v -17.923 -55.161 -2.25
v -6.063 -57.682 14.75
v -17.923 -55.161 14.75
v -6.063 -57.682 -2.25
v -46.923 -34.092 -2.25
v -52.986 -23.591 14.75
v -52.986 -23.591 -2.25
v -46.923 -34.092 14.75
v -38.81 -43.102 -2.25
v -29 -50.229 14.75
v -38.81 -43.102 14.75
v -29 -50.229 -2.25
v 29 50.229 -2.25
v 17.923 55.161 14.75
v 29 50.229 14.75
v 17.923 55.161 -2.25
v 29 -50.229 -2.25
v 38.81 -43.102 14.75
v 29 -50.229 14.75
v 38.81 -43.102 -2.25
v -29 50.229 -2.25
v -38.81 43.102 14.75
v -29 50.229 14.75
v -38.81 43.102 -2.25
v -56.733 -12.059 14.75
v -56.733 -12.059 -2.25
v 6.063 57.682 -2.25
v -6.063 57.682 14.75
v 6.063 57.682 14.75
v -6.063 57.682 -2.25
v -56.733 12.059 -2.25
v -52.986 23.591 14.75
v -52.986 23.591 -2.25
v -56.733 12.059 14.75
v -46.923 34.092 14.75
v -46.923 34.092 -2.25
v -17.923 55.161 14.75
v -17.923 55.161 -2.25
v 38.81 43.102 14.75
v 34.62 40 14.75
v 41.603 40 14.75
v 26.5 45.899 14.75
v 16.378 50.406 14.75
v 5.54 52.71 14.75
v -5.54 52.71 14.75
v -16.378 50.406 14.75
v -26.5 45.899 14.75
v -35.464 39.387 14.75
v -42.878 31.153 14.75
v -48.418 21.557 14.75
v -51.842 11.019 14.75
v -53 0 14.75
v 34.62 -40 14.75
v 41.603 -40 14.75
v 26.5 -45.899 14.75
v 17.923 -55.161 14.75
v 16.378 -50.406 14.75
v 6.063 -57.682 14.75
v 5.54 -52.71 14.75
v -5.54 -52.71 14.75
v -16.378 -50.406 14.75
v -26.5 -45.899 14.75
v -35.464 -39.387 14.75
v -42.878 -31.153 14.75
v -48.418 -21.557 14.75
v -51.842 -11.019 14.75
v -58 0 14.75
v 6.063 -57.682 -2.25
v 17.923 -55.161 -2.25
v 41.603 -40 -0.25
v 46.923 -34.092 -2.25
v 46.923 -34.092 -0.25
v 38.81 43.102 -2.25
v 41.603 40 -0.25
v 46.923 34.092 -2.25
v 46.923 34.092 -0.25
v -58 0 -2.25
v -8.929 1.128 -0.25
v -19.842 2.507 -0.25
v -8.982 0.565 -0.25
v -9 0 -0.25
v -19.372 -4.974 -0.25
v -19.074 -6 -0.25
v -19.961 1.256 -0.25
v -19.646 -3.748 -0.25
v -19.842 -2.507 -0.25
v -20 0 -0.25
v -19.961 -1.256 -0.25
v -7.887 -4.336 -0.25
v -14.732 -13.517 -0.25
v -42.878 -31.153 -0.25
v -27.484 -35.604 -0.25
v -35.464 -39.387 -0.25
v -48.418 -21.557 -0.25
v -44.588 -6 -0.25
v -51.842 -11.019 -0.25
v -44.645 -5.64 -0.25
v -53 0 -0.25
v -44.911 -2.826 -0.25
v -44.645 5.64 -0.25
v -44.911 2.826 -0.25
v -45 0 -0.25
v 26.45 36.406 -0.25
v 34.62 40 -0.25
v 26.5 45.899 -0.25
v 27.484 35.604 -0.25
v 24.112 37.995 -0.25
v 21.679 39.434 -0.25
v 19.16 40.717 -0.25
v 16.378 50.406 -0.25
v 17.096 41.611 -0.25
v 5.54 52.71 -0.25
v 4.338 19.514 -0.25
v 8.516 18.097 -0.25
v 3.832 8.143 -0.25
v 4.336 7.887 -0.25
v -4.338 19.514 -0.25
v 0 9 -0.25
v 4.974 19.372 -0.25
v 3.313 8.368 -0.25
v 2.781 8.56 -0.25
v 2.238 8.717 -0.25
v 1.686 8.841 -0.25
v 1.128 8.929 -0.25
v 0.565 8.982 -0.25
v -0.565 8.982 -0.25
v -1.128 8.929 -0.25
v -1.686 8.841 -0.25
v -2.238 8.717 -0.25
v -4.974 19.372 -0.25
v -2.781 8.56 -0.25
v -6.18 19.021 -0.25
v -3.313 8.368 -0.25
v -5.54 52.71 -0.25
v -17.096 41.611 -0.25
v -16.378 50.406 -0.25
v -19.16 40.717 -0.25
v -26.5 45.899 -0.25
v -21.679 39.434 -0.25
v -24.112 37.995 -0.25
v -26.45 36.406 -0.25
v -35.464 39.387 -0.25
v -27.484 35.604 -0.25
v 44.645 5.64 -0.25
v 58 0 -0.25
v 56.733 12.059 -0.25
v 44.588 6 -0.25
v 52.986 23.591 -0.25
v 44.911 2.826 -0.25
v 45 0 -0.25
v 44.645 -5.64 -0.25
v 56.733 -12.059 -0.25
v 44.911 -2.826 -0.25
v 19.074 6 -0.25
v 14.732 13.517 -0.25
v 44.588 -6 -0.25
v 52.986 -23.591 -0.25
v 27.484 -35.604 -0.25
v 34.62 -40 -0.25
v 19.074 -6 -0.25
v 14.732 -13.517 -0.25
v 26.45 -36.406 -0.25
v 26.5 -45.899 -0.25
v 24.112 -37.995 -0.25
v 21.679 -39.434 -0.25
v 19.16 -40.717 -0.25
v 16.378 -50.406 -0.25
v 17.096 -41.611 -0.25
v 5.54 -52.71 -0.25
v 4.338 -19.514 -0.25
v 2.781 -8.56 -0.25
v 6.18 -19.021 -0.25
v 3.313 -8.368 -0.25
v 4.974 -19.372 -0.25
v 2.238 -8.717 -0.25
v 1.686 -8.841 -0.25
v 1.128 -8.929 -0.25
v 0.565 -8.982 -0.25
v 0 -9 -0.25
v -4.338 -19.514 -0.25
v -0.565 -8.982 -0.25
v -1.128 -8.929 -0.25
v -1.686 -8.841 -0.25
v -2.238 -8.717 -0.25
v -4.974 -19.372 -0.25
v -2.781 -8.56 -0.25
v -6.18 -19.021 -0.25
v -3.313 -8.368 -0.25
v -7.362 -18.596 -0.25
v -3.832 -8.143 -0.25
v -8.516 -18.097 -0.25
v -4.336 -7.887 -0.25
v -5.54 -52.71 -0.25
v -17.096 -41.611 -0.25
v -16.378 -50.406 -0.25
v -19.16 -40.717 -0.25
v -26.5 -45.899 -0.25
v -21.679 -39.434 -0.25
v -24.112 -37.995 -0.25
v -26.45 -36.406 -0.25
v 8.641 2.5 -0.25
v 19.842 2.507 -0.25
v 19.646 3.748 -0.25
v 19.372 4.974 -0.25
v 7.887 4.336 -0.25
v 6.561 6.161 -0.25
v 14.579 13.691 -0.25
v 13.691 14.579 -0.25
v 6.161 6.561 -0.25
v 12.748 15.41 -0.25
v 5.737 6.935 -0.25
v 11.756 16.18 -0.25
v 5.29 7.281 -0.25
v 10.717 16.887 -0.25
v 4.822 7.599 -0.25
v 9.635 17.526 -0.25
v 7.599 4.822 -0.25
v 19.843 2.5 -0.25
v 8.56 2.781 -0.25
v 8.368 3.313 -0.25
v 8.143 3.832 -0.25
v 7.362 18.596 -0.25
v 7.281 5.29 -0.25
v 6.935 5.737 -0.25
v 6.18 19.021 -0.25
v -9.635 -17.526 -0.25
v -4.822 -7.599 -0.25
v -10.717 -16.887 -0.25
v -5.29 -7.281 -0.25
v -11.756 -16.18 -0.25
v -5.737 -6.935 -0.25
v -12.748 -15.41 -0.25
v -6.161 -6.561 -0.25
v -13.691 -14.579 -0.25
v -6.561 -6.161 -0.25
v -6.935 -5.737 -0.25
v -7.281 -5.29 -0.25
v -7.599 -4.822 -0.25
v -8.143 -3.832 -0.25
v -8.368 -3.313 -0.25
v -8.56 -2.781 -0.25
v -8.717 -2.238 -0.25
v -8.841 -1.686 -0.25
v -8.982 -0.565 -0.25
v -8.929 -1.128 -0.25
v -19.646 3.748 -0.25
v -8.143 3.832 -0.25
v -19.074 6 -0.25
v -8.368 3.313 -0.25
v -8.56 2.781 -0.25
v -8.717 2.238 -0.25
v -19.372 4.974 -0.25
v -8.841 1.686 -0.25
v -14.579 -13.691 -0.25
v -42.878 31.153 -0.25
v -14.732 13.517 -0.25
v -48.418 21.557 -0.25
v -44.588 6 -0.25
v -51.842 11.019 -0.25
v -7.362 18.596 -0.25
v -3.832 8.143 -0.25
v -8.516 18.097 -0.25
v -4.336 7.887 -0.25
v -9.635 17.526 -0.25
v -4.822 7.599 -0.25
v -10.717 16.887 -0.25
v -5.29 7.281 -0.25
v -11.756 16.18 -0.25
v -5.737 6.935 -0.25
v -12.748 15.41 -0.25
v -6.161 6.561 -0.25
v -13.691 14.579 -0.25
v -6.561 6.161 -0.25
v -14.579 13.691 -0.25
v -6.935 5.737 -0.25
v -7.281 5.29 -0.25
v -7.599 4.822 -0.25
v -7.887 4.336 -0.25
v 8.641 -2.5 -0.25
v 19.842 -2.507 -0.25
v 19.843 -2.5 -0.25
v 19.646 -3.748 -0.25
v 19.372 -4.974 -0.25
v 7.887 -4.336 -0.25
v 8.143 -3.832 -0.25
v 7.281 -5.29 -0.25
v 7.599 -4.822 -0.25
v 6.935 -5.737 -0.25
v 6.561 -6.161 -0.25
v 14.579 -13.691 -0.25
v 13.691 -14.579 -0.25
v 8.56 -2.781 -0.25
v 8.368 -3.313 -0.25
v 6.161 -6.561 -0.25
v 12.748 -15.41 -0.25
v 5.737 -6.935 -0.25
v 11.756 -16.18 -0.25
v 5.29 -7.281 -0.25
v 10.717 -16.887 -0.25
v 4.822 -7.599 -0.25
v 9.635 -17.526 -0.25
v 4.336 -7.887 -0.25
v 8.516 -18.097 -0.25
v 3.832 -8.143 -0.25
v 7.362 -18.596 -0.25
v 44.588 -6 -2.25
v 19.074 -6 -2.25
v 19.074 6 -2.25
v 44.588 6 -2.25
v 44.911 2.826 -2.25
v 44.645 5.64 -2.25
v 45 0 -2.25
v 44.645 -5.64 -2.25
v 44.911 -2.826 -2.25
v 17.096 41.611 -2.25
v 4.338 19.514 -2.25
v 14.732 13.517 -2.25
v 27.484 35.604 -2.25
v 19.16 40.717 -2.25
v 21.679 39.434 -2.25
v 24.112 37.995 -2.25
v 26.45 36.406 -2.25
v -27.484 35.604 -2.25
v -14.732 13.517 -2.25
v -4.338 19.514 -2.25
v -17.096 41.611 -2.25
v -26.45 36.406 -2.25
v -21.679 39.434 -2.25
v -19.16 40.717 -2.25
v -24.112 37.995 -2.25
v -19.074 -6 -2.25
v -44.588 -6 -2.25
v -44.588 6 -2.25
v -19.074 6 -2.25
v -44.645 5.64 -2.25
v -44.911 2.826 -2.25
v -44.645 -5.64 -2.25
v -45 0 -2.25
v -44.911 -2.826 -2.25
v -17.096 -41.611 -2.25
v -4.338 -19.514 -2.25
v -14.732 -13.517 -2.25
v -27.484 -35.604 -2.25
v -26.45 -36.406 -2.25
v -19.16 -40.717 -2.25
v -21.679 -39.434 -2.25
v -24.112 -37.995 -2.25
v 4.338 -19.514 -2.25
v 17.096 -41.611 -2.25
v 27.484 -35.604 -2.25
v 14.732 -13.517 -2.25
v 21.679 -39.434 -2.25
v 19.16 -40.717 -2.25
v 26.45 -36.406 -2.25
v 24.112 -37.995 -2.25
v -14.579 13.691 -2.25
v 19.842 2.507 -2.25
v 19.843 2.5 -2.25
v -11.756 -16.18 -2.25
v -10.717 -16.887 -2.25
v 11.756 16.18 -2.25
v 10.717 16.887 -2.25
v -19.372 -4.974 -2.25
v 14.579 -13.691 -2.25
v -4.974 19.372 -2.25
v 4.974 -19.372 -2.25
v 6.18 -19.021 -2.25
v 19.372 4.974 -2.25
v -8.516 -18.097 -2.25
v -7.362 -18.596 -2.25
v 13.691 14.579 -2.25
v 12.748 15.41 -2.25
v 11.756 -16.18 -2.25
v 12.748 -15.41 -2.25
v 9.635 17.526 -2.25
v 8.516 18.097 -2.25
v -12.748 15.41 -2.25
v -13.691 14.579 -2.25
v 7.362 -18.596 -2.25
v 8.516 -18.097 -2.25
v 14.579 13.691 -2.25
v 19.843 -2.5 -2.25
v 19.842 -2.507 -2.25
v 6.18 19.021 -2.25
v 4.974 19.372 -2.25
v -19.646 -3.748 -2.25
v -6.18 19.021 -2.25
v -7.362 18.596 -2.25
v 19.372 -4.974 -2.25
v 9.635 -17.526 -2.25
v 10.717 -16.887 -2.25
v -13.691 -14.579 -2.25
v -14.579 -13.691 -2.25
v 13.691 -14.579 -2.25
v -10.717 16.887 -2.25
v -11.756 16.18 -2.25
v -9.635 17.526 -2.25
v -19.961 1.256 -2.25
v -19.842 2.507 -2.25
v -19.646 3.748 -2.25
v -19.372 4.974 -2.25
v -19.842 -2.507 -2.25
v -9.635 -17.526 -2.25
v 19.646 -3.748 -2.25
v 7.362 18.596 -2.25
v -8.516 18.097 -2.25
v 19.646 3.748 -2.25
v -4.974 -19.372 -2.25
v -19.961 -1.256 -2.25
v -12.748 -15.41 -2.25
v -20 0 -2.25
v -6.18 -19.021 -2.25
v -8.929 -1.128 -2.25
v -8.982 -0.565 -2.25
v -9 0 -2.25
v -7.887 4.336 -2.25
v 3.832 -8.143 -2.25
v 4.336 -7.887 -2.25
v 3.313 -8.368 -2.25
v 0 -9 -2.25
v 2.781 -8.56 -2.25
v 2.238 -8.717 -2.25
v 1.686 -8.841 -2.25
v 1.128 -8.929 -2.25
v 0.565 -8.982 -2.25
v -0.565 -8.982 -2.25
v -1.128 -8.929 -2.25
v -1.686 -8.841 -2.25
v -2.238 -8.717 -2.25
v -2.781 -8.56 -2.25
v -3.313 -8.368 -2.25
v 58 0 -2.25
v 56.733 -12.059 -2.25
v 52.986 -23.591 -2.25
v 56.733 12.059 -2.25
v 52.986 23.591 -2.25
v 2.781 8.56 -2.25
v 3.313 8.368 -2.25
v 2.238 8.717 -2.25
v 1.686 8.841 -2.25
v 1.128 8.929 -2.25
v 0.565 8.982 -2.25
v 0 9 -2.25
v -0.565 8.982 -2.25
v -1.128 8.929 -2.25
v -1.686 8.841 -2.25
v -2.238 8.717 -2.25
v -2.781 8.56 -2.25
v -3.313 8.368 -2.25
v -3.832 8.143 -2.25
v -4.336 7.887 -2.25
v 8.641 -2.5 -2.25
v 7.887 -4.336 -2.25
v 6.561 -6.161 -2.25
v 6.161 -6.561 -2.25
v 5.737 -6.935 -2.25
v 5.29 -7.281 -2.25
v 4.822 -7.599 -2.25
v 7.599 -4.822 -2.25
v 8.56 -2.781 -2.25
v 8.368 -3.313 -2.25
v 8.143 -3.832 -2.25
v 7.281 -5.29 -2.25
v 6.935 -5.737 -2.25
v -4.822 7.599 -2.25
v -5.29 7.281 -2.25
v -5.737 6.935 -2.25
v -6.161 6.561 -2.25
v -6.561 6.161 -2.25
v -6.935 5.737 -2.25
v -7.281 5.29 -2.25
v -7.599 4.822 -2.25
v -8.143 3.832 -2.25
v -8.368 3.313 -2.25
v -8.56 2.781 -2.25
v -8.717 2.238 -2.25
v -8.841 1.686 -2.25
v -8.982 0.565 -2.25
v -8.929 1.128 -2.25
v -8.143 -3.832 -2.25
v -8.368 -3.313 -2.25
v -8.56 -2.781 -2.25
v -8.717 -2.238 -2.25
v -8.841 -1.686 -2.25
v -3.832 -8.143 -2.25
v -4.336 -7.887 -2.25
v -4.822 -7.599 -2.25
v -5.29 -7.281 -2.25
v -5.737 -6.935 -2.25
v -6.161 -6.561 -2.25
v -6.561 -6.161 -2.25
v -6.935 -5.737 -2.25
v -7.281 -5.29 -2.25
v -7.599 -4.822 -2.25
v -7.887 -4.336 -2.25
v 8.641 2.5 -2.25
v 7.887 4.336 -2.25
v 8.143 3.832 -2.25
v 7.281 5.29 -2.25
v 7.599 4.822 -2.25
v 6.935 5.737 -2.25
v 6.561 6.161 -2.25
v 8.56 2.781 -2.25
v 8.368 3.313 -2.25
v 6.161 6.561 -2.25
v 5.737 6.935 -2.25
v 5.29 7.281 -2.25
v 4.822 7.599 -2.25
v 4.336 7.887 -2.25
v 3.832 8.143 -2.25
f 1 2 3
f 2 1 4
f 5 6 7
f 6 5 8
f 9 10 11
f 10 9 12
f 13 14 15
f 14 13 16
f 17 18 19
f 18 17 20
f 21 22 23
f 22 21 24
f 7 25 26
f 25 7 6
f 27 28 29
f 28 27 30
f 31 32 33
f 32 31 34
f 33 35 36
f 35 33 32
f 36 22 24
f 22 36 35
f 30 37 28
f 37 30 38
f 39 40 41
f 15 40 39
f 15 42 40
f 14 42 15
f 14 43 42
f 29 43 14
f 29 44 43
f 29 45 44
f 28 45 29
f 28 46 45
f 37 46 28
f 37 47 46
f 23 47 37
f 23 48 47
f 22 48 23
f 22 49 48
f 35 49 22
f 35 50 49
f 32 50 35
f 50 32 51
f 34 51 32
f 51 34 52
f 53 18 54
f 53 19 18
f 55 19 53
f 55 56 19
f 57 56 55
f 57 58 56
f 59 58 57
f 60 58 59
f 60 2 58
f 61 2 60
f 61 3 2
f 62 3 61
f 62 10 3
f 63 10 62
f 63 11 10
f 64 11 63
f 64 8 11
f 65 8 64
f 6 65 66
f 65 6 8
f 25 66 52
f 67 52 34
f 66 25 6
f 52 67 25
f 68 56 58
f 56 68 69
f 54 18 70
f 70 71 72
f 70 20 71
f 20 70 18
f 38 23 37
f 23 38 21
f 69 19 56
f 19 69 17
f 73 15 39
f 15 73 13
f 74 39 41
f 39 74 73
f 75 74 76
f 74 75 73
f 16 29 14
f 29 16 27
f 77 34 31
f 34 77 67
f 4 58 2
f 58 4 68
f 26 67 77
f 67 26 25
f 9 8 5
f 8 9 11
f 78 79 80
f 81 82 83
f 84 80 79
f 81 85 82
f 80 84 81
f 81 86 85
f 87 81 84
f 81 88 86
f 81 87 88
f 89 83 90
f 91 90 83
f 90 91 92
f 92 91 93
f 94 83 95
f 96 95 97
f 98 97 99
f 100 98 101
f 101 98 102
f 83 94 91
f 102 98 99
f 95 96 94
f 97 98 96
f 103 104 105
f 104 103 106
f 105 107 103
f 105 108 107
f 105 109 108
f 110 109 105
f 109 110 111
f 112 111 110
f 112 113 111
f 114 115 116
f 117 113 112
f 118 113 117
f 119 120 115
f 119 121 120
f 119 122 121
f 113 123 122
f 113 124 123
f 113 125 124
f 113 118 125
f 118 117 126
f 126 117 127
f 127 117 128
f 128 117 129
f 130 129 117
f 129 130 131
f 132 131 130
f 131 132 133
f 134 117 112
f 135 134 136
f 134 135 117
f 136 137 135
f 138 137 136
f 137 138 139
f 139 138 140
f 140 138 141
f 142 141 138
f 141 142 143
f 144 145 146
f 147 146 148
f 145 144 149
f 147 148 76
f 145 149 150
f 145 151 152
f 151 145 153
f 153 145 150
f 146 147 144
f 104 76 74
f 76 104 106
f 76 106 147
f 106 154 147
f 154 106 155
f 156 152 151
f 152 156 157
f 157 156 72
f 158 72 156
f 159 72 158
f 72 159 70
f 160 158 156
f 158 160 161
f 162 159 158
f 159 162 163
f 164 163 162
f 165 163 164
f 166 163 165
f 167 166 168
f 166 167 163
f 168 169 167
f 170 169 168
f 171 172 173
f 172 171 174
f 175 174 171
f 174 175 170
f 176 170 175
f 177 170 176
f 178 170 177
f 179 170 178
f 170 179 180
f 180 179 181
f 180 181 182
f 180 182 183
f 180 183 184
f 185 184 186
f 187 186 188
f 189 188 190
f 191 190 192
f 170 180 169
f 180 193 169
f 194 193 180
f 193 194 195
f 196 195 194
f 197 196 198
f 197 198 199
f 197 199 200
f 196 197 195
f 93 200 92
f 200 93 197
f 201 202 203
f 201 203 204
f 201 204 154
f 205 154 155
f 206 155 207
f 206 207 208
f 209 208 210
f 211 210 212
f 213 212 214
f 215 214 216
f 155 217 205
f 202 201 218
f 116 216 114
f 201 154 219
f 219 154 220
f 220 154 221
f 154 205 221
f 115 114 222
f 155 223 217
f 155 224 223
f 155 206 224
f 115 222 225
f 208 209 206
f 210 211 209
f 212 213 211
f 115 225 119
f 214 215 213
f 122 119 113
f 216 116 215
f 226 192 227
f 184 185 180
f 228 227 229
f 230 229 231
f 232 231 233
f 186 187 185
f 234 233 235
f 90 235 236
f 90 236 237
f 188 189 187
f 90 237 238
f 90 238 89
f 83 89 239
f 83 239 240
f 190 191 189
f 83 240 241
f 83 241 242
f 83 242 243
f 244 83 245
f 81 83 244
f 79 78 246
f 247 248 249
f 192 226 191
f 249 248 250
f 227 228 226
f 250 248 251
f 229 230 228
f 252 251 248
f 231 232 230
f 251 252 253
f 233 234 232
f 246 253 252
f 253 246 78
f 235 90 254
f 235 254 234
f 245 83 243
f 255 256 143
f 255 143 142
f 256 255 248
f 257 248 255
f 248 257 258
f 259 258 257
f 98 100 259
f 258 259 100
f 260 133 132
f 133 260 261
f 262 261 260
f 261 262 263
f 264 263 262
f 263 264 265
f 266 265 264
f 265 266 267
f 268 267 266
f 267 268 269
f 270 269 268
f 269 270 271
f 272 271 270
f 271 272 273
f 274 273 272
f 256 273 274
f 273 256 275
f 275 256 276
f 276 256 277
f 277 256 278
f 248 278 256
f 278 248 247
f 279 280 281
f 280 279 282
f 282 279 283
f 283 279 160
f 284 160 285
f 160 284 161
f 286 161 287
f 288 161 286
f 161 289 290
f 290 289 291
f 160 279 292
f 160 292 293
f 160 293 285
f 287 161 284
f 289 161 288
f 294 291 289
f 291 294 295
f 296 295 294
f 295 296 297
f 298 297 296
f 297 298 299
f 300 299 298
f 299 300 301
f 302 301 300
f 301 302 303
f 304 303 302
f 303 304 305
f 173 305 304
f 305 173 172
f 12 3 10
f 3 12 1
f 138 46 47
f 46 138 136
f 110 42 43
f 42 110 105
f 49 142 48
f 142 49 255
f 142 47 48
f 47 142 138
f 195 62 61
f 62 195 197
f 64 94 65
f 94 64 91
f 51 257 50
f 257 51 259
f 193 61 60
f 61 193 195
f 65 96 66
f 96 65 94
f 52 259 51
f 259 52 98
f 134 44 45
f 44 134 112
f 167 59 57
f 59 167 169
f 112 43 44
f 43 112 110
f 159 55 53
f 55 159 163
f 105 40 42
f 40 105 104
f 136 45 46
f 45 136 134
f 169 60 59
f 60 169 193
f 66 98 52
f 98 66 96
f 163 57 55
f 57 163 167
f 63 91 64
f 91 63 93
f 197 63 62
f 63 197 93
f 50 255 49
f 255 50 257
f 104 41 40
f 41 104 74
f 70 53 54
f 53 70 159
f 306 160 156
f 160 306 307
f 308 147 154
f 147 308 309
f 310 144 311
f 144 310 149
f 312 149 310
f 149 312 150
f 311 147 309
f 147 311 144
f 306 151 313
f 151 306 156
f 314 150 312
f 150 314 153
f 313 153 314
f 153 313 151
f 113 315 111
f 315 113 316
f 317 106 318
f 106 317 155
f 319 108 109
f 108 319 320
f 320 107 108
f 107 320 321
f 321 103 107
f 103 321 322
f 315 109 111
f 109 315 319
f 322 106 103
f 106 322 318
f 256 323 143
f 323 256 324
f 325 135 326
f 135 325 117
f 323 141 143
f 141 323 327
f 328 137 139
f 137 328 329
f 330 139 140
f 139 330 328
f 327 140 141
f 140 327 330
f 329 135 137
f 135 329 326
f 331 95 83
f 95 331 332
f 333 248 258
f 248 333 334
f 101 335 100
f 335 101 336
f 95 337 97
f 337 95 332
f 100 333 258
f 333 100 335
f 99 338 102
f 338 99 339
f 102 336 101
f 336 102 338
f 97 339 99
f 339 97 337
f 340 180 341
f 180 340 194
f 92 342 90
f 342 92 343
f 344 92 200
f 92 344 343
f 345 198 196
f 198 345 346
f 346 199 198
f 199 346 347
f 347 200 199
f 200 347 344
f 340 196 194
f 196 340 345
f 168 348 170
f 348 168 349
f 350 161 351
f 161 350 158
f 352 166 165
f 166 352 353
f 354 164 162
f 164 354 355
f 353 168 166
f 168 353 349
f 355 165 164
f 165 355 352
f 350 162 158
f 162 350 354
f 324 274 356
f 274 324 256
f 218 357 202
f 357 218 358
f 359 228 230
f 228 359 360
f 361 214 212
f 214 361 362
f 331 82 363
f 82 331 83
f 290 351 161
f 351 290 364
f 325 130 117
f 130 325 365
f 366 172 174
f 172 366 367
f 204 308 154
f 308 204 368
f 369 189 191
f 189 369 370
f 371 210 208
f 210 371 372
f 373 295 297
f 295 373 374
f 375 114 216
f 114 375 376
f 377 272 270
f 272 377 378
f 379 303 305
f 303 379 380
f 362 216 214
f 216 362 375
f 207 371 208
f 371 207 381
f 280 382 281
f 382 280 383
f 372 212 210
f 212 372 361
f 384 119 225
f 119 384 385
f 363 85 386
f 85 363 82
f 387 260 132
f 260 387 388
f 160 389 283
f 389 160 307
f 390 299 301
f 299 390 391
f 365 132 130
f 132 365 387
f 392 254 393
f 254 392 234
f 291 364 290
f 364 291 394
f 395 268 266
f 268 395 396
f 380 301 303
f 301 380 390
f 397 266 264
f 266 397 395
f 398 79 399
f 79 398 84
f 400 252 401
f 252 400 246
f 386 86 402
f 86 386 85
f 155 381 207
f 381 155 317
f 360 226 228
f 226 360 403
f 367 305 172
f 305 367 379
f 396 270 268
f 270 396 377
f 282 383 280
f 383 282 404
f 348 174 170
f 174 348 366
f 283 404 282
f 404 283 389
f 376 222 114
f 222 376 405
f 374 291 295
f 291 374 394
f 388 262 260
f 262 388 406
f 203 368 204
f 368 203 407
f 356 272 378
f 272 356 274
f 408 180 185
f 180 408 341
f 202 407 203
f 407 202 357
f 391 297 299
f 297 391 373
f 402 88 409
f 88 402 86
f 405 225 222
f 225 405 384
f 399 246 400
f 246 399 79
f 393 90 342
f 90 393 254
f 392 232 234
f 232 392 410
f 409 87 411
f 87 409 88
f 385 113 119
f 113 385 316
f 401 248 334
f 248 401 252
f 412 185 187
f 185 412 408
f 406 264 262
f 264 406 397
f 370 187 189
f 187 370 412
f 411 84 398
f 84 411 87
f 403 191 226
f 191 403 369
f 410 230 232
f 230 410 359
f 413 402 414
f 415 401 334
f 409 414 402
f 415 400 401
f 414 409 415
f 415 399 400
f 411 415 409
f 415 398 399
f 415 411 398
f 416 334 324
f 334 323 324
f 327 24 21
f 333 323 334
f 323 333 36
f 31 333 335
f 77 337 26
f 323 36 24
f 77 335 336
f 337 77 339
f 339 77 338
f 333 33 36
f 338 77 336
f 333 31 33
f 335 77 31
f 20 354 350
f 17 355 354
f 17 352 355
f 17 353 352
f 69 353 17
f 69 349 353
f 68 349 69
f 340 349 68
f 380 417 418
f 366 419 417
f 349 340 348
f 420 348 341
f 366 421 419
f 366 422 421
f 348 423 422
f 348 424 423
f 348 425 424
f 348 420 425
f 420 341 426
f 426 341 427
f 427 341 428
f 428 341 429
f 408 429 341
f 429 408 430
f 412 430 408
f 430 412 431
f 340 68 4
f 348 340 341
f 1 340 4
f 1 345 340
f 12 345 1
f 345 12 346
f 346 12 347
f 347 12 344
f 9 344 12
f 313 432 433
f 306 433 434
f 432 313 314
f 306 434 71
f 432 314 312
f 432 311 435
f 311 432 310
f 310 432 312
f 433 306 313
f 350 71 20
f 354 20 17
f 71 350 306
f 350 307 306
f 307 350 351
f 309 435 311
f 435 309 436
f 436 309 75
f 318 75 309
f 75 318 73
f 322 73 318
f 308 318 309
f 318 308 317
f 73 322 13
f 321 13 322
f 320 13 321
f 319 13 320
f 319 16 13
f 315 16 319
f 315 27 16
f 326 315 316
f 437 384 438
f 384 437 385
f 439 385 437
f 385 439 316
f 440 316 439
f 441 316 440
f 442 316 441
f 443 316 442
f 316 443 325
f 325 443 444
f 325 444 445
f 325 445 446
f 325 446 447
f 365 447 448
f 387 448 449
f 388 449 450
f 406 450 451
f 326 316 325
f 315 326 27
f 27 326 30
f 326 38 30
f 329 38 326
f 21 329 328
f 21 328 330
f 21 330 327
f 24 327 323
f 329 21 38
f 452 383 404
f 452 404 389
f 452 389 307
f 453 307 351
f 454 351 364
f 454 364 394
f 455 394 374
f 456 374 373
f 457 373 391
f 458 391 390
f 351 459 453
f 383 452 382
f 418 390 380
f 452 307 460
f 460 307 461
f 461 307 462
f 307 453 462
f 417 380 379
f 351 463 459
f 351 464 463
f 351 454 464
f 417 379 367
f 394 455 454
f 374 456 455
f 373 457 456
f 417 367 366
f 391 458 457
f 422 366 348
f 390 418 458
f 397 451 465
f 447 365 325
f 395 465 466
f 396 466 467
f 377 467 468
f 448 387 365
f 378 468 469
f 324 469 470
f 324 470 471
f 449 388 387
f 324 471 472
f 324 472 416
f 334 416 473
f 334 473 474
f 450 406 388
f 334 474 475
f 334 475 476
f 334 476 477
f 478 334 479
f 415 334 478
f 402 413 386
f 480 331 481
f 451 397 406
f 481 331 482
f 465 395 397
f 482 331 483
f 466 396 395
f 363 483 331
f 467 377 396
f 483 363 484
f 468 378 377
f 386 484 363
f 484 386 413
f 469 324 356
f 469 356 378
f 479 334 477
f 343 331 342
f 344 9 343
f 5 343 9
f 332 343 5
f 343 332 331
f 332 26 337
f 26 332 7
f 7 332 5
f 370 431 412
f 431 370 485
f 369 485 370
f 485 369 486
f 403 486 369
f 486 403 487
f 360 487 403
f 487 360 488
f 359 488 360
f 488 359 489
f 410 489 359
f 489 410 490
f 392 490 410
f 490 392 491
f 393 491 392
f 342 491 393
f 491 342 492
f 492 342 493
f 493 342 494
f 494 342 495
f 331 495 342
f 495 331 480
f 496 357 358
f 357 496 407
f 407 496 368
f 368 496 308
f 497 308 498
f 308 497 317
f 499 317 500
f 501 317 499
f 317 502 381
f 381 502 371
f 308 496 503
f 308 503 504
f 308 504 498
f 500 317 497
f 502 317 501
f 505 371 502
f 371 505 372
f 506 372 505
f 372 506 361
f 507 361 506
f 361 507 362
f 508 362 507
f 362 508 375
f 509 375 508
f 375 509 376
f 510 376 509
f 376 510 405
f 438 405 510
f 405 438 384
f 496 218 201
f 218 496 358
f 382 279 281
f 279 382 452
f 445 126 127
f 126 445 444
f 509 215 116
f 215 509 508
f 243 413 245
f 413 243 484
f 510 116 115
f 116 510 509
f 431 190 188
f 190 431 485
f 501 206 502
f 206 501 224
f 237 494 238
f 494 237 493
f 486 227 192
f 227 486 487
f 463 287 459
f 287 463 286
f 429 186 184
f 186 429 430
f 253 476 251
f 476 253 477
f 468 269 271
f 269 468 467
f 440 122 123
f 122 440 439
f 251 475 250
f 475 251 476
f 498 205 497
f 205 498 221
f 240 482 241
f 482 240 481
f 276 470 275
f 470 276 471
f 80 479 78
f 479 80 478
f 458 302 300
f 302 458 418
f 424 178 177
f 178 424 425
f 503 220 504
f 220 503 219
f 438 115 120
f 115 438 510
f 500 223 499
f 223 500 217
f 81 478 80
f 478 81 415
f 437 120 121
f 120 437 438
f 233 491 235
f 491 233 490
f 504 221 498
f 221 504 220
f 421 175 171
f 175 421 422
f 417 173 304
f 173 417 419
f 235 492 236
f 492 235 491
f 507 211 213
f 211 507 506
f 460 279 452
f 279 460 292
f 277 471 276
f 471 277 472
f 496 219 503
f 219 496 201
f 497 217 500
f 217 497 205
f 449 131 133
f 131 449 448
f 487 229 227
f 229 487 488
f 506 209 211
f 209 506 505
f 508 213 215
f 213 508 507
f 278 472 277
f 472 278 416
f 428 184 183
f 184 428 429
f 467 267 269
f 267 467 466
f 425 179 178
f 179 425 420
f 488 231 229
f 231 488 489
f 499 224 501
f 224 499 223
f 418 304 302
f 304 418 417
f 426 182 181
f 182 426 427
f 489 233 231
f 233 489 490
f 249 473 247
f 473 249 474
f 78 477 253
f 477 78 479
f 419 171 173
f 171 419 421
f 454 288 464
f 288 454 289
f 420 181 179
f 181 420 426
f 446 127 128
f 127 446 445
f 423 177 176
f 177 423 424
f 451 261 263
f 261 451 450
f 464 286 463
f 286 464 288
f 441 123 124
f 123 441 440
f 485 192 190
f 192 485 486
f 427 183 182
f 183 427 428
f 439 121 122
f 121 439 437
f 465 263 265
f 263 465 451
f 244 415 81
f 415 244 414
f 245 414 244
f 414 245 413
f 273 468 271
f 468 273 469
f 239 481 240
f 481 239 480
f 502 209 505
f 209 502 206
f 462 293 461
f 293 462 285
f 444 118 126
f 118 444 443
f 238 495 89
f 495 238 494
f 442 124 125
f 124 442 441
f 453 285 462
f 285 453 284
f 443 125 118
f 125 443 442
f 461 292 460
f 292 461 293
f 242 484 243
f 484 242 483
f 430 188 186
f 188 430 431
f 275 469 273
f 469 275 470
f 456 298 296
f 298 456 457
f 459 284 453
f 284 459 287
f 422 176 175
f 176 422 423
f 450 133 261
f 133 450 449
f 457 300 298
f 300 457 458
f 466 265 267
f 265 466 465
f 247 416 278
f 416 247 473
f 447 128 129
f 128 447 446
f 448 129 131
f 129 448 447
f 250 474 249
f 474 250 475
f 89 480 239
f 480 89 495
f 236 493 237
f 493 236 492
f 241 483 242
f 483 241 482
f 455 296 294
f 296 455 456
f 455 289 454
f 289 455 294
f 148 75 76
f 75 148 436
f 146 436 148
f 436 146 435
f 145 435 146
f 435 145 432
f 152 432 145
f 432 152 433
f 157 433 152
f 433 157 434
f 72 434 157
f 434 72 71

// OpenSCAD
module GM3_motor_shaft(height, diameter, key_length, screw_hole_diameter) {
	difference() {	
		cylinder(h=height, r=diameter/2, center=true, $fn=100);
		translate([0,key_length,0]) cube([diameter,key_length, height+2], center=true);
		translate([0,-key_length,0]) cube([diameter,key_length, height+2], center=true);
		cylinder(h=height+2, r= screw_hole_diameter/2, center=true, $fn=100);
	}
}

module GM3_motor_body() {
	translate([28,0,-20.8/2]){
		color("white")translate([-37/2,0,0])cube([37,22.3,20.8],center=true);
		color("grey")translate([27.2/2,0,0]) rotate([0,90,0]) cylinder(h=27.2,r=18/2, center=true);
	}
}

module GM3_motor() {
	translate([0,0,-2.5]) GM3_motor_body();
	rotate($t*360) color("white") GM3_motor_shaft(5, 7, 4.8, 1);

}
module ball_bearing(od,id,w) {
	difference() {
		cylinder(r=od/2,h=w,center=true);
		cylinder(r=id/2,h=w+2,center=true);
	}
}	

module ShotPumpWheel(height, center_d, n_arms, w_arm, l_arm, hole_diameter) {
	translate([0,0,height/2]) cylinder(h=height,r=center_d/2, center=true, $fn=100);
    cylinder(h=height*.75, r=7,center=true,$fn=100);
	for (z=[0:(n_arms-1)]) {

		rotate((z*360/(n_arms)) + 90) translate([0,l_arm/2,height/2]) {
			difference () {
				union () {
					intersection() {
						cube([w_arm, l_arm, height], center=true);
						translate([0,l_arm/2-w_arm/2,0]) cylinder(r=w_arm/2,h = height, center=true);
					}
					cube([w_arm, l_arm-w_arm, height], center=true);


				}
				translate([0,l_arm/2 - (hole_diameter),0]) {
					cylinder(h=100, r=hole_diameter/2,center=true, $fn=100);
				}
			}
			%translate([0,l_arm/2-hole_diameter*1,height/2+8/2]) ball_bearing(22,8,8);
		}
	}
}

module ShotPump (height, center_d, n_arms, w_arm, l_arm, m_height, m_diameter, m_key_length, hole_diameter) {
	difference() {
		ShotPumpWheel(height, center_d, n_arms, w_arm, l_arm,hole_diameter);
		GM3_motor_shaft(m_height+20,m_diameter,m_key_length,0);
	}
}
module ShotPumpContainer() {

translate([0,0,15/2]) difference() {
cylinder(r=58,h=15,center=true);
cylinder(r=53,h=40,center=true);
	translate([200,0,0]) cube([400,80,50],center=true);

}

intersection() {

union() {
	translate([0,0,-1]) difference() {
		difference() {
			cube([200,900,2],center=true);
			difference() {
			for (i = [1:6]) {
			intersection() {

			rotate(30*2*i + 30) translate([0,-32,0]) cube([12,60,50], center= true);
			cylinder(h=10,r=45, center=true, $fn=100);
		

			}
		}
			cylinder(h=10,r=20, center=true, $fn=100);

}			

		}
		union () {
			translate([10,0,0])cube([20,5,5],center=true);
			cylinder(h=10,r=9, center=true, $fn=100);
		}
	}
//	translate([50,9,0]) cube([25,10,15]);
//	translate([50,-19,0]) cube([25,10,15]);
}
cylinder(r=58,h=200,center=true);

}
}
//rotate([0*$t*360,0*$t*360, $t*0]) {
//GM3_motor();
//rotate($t*360) color("red") ShotPump(4,40,3,17,45, 5,7.2,5,8);
translate([0,0,-0.25])ShotPumpContainer();
//}
